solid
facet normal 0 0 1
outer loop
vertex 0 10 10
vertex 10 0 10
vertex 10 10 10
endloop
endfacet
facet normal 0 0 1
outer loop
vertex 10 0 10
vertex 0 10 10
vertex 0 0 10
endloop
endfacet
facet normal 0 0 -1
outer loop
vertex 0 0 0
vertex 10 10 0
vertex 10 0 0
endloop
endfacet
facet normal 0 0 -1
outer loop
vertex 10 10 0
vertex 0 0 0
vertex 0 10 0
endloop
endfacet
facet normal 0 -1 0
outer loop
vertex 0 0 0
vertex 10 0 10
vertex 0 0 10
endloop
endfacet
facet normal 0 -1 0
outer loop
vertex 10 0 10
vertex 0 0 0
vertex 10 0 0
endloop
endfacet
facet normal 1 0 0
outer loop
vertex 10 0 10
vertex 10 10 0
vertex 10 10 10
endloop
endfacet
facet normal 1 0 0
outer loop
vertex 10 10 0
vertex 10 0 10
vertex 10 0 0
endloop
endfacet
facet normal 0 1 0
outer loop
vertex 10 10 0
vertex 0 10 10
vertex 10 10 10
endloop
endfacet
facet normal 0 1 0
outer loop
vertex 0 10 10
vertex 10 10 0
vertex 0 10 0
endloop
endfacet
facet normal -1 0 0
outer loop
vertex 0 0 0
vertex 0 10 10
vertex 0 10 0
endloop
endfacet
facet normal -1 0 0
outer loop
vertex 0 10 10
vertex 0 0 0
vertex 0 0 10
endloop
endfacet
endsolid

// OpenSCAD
cube(size = 10);
/* Generated from the following ExpSolid code:

#! /usr/bin/env python

from pathlib import Path

from solid2 import *

# =============
# = Extension =
# =============
# This is more or less the same as -- regular -- SolidPython does when it
# writes a scad file. It appends the python source to the end of the *.scad
# file.
#
# If you like this, you can simply import this extension that should do it.
#
# register the post_render extension using the decorator. This hooks it into
# the "_render" routine. It will be called after the root gets rendered. It's
# return string will be appended to the rendered string.
@register_post_render
def attach_code_post_render(root):
    #find the "root" file
    calling_file = None

    import __main__
    # not called from a terminal?
    if hasattr(__main__, "__file__"):
        # extract filename and replace suffix
        calling_file = Path(__main__.__file__).absolute()
    else:
        return '' # no code available. Called from withing a python shell

    assert(calling_file.exists())

    # read source file
    with calling_file.open("r") as f:
        code_str = f.read()

        # escape /_* and *_/ because otherwise it would end this comment block which
        # we use to inject the solid code
        code_str = code_str.replace("/_*", "/_*")
        code_str = code_str.replace("*_/", "*_/")

        # return the string to be appended to the *.scad file
        return f'/_* Generated from the following ExpSolid code:\n\n' +\
               f'{code_str}*_/'

# =============

if __name__ == "__main__":
    c = cube(10)
    c.save_as_scad()

*/
